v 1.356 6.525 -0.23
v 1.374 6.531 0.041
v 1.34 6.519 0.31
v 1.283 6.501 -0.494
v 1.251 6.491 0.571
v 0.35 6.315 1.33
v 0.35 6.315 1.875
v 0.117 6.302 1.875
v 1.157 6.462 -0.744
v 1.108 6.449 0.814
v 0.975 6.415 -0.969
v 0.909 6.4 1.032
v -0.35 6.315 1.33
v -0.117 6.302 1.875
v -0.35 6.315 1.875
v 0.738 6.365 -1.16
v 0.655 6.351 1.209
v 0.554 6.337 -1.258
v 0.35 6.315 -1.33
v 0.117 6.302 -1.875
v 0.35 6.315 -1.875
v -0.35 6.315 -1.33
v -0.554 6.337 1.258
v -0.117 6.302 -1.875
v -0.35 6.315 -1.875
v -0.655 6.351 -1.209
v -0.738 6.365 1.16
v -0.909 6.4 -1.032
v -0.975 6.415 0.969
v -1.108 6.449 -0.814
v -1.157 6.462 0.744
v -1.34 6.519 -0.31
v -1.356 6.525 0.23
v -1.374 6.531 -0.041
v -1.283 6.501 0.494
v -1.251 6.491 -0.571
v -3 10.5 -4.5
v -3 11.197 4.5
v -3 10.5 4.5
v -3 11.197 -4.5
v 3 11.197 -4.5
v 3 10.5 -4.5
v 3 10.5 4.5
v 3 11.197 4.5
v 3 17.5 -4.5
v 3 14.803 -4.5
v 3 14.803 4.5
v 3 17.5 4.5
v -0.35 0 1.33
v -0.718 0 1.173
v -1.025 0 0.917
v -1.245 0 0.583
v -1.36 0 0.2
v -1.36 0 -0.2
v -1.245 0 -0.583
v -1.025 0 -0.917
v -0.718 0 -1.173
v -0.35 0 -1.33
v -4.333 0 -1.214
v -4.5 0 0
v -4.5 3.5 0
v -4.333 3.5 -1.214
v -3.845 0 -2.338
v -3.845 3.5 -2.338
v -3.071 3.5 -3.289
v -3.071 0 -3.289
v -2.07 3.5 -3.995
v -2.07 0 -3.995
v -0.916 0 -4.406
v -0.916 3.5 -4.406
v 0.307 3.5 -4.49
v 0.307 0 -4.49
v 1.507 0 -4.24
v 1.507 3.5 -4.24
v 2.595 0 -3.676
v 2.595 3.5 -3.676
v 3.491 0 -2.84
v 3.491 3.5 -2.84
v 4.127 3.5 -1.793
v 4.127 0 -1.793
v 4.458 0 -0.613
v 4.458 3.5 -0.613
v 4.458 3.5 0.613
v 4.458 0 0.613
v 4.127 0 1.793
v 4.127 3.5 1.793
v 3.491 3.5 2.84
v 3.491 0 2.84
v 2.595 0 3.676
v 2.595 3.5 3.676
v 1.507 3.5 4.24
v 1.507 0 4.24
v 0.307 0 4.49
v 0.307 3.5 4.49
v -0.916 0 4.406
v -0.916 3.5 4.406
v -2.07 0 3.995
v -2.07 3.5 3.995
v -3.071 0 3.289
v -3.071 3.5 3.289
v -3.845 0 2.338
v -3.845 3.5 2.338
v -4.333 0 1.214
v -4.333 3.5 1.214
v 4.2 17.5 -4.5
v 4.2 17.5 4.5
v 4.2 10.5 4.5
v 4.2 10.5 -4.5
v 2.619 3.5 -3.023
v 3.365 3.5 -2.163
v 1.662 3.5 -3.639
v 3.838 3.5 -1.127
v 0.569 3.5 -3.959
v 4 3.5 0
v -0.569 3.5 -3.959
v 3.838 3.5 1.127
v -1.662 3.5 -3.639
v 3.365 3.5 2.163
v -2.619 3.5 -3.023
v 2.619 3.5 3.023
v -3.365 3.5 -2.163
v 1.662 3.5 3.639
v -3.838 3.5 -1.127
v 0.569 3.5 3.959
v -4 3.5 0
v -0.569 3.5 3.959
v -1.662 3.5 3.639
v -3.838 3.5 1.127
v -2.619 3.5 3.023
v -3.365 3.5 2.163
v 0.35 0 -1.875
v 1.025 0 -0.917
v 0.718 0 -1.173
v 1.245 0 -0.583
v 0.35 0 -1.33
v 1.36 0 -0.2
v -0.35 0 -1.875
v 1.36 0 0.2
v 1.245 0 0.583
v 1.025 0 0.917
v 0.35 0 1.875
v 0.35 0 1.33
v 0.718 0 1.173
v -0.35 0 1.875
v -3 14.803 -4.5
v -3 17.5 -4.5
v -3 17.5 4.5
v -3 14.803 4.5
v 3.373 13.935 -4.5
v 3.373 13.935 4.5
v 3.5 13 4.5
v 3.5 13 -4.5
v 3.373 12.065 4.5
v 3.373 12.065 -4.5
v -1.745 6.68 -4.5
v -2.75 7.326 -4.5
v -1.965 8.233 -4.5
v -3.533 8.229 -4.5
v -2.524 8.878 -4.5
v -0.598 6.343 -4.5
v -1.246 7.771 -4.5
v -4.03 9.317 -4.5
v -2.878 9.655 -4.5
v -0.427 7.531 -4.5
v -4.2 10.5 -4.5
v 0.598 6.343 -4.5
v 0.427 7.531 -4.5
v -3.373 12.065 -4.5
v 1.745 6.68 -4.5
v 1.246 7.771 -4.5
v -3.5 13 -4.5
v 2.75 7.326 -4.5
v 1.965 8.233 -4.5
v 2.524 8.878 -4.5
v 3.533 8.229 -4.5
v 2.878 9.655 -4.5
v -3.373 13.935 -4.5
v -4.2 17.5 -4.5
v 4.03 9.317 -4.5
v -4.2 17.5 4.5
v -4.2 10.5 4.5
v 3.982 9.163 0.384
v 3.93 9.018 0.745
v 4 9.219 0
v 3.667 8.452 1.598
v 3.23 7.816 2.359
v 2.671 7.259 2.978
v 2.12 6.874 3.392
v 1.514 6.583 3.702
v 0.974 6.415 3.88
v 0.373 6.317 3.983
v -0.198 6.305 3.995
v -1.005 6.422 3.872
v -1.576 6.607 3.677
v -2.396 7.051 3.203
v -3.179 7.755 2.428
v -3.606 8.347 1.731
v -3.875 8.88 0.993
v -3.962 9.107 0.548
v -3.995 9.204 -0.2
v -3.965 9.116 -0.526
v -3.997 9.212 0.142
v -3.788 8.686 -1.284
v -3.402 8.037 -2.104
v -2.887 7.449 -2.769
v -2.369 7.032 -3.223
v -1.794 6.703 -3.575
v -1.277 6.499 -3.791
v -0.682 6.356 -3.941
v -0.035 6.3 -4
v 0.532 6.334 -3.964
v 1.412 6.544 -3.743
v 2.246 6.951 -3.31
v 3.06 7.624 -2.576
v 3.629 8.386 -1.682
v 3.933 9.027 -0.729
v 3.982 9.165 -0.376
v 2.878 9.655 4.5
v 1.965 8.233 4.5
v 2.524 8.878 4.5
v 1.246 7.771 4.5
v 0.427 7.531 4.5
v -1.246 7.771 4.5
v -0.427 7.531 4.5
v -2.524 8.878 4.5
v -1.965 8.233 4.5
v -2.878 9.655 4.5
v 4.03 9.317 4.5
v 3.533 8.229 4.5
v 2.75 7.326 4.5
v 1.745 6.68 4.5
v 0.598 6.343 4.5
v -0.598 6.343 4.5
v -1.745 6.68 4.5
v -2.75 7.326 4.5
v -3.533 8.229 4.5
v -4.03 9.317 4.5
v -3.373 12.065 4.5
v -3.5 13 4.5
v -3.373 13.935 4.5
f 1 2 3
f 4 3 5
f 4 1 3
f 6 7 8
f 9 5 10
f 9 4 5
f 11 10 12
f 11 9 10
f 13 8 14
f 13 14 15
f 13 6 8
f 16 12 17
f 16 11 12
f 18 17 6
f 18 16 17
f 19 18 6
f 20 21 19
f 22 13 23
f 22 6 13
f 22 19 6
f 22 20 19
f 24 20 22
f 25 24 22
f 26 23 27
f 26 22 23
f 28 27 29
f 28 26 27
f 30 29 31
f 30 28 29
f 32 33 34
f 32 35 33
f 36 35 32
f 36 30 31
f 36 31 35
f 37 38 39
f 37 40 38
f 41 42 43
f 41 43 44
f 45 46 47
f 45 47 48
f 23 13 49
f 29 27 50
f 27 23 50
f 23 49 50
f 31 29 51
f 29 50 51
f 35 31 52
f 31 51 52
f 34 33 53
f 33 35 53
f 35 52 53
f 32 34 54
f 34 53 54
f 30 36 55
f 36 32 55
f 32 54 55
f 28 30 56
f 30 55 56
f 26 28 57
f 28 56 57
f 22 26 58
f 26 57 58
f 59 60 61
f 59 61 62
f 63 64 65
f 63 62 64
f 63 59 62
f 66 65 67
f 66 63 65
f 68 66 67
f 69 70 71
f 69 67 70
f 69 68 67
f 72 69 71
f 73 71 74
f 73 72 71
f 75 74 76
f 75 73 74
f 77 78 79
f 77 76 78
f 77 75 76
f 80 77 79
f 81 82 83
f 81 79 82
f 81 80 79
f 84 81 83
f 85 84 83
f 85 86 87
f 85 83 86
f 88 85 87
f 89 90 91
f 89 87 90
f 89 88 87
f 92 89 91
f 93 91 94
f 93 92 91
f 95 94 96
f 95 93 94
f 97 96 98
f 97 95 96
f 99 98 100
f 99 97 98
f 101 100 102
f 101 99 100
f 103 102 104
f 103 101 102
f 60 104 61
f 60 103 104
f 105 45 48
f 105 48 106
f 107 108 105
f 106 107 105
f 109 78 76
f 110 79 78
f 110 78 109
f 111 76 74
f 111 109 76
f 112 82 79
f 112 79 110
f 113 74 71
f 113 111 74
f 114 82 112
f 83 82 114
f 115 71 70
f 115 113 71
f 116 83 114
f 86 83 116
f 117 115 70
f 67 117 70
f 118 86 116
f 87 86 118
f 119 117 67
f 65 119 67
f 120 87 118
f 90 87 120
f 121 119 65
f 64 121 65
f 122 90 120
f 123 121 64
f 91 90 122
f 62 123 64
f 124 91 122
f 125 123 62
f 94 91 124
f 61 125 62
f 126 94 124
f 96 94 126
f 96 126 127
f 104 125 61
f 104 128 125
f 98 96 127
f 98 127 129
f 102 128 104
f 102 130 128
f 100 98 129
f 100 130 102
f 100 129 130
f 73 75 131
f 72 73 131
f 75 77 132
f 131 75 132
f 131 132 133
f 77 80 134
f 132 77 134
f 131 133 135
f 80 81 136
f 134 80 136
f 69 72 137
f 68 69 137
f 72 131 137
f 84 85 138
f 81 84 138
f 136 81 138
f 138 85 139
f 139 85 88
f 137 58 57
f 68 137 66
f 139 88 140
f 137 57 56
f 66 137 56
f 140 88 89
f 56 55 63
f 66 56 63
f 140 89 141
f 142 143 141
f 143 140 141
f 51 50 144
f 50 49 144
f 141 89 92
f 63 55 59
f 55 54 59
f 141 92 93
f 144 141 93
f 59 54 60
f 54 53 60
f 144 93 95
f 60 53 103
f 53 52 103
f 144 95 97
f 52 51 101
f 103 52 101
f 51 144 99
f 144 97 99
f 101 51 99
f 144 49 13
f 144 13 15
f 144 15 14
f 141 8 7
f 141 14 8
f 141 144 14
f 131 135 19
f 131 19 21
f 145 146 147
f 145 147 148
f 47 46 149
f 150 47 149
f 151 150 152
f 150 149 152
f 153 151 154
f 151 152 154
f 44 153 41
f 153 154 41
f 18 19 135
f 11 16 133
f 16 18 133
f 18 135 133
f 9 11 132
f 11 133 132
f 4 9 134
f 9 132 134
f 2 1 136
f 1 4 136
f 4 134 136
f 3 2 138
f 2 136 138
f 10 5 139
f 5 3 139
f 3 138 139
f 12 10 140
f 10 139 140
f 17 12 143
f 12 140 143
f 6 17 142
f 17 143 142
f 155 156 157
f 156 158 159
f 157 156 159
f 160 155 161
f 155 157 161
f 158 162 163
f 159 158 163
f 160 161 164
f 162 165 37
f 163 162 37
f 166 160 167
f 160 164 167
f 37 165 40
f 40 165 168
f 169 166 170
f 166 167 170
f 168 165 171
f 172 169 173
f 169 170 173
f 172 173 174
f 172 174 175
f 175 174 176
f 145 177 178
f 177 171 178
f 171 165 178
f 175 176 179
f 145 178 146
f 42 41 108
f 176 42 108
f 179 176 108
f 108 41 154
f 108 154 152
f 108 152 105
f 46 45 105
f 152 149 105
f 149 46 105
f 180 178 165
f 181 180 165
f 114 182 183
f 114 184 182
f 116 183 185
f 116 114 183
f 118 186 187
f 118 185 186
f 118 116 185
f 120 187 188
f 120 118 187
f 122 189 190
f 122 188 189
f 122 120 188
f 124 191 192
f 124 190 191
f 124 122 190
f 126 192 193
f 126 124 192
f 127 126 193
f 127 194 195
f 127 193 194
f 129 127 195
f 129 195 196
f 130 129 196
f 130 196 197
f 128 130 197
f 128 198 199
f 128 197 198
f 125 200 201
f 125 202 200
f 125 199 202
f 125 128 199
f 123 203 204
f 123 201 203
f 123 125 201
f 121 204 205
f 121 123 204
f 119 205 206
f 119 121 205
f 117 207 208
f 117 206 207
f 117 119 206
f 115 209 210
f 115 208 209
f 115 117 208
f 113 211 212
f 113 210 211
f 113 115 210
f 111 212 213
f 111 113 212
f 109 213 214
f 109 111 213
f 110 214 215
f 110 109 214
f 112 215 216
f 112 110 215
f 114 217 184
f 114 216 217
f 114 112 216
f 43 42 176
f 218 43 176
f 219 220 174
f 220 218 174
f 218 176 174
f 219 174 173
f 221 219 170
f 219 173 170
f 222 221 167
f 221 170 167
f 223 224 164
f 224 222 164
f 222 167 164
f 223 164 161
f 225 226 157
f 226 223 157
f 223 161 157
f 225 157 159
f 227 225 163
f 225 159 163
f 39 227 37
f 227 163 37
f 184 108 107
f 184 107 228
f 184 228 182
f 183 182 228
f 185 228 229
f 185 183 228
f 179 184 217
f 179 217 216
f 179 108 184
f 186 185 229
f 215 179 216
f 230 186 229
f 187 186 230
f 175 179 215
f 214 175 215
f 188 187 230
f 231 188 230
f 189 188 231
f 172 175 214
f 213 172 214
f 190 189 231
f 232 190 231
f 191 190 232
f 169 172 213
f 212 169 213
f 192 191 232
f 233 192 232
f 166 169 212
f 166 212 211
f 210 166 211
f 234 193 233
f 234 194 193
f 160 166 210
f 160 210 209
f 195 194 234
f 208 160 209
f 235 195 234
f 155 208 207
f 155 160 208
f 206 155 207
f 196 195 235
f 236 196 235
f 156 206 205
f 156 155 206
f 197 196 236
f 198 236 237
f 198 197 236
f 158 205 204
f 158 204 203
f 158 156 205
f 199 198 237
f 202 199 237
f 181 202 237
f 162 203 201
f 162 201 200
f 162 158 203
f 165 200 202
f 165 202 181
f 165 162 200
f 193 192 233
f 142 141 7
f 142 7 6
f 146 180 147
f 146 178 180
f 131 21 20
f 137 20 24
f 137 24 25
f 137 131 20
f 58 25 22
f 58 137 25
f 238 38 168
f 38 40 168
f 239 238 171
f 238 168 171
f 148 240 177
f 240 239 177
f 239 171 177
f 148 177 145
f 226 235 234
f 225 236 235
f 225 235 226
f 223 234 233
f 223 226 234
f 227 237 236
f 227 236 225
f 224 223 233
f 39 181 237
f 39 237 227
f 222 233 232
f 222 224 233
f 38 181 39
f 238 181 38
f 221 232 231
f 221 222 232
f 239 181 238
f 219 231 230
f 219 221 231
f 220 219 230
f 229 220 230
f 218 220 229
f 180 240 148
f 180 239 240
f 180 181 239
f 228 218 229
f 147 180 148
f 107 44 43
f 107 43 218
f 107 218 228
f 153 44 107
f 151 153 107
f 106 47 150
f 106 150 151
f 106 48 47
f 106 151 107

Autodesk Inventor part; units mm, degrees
ref_plane "YZ Plane" through (0, 0, 0) normal (1, 0, 0) x (0, 1, 0)
ref_plane "XZ Plane" through (0, 0, 0) normal (0, 1, 0) x (-1, 0, 0)
ref_plane "XY Plane" through (0, 0, 0) normal (0, 0, 1) x (1, 0, 0)
sketch "Sketch1" plane through (0, 0, 0) normal (0, 1, 0) x (-1, 0, 0)
  circle A0 centre (0, 0) radius 1.115 construction
  arc A1 (-0.35, 1.3297) -> (-0.35, -1.3297) centre (0, 0) ccw
  circle A2 centre (0, 0) radius 4.5
  line L0 (0.35, 1.875) -> (-0.35, 1.875)
  line L1 (-0.35, 1.875) -> (-0.35, -1.875)
  line L2 (-0.35, -1.875) -> (0.35, -1.875)
  line L3 (0.35, -1.875) -> (0.35, 1.875)
  arc A3 (0.35, 1.3297) -> (-0.35, 1.3297) centre (0, 0) ccw
  arc A4 (0.35, -1.3297) -> (0.35, 1.3297) centre (0, 0) ccw
  arc A5 (-0.35, -1.3297) -> (0.35, -1.3297) centre (0, 0) ccw
  point P0 (0, 1.875)
  point P1 (0.35, 0)
  dimension "d1" = 2.23
  dimension "d3" = 9
  dimension "d18" = 0.26
  dimension "d19" = 0.7
  dimension "d20" = 3.75
extrude "Extrusion1" add sketch "Sketch1" along normal blind 3.5
sketch "Sketch4" plane through (0, 0, 0) normal (0, 0, 1) x (1, 0, 0)
  line L0 (-4.2, 17.5) -> (-4.2, 10.5)
  arc A0 (-4.2, 10.5) -> (4.2, 10.5) centre (0, 10.5) ccw
  line L1 (4.2, 10.5) -> (4.2, 17.5)
  line L2 (-3, 17.5) -> (-3, 14.8028)
  arc A1 (-3, 10.5) -> (3, 10.5) centre (0, 10.5) ccw
  line L3 (3, 10.5) -> (3, 11.1972)
  line L4 (-4.2, 17.5) -> (-3, 17.5)
  line L5 (3, 17.5) -> (4.2, 17.5)
  line L6 (-0.35, 0) -> (0.35, 0) projected
  line L7 (4.5, 3.5) -> (-4.5, 3.5) projected
  circle A2 centre (0, 13) radius 3.5
  line L8 (-3, 14.8028) -> (-3, 11.1972)
  line L9 (-3, 11.1972) -> (-3, 10.5)
  line L10 (3, 11.1972) -> (3, 14.8028)
  line L11 (3, 14.8028) -> (3, 17.5)
  point P0 (0, 0)
  point P1 (0, 0)
  dimension "d21" = 3
  dimension "d23" = 1.2
  dimension "d24" = 7
  dimension "d25" = 7
  dimension "d26" = 7
  dimension "d27" = 2.5
extrude "Extrusion5" add sketch "Sketch4" along normal mid plane 9 contours L4 L2 A2 L9 A1 L3 L11 L5 L1 A0 L0
sketch "Sketch8" plane through (0, 3.5, 0) normal (0, 1, 0) x (1, 0, 0)
  circle A0 centre (0, 0) radius 4
  arc A1 (0.35, -1.3297) -> (0.35, 1.3297) centre (0, 0) ccw projected
  line L0 (0.35, 1.875) -> (0.35, 1.3297) projected
  line L1 (-0.35, 1.875) -> (0.35, 1.875) projected
  line L2 (-0.35, 1.3297) -> (-0.35, 1.875) projected
  arc A2 (-0.35, 1.3297) -> (-0.35, -1.3297) centre (0, 0) ccw projected
  line L3 (-0.35, -1.875) -> (-0.35, -1.3297) projected
  line L4 (0.35, -1.875) -> (-0.35, -1.875) projected
  line L5 (0.35, -1.3297) -> (0.35, -1.875) projected
  dimension "d33" = 8
extrude "Extrusion6" add sketch "Sketch8" along normal up to next
sketch "Sketch2" plane through (0, 3.5, 0) normal (0, 1, 0) x (1, 0, 0)
  circle A0 centre (0, 0) radius 1.375 projected
  circle A1 centre (0, 0) radius 3.375
  dimension "d6" = 2
  dimension "d9" = 7.3
  dimension "d10" = 2
properties part number "Laser Mount"
